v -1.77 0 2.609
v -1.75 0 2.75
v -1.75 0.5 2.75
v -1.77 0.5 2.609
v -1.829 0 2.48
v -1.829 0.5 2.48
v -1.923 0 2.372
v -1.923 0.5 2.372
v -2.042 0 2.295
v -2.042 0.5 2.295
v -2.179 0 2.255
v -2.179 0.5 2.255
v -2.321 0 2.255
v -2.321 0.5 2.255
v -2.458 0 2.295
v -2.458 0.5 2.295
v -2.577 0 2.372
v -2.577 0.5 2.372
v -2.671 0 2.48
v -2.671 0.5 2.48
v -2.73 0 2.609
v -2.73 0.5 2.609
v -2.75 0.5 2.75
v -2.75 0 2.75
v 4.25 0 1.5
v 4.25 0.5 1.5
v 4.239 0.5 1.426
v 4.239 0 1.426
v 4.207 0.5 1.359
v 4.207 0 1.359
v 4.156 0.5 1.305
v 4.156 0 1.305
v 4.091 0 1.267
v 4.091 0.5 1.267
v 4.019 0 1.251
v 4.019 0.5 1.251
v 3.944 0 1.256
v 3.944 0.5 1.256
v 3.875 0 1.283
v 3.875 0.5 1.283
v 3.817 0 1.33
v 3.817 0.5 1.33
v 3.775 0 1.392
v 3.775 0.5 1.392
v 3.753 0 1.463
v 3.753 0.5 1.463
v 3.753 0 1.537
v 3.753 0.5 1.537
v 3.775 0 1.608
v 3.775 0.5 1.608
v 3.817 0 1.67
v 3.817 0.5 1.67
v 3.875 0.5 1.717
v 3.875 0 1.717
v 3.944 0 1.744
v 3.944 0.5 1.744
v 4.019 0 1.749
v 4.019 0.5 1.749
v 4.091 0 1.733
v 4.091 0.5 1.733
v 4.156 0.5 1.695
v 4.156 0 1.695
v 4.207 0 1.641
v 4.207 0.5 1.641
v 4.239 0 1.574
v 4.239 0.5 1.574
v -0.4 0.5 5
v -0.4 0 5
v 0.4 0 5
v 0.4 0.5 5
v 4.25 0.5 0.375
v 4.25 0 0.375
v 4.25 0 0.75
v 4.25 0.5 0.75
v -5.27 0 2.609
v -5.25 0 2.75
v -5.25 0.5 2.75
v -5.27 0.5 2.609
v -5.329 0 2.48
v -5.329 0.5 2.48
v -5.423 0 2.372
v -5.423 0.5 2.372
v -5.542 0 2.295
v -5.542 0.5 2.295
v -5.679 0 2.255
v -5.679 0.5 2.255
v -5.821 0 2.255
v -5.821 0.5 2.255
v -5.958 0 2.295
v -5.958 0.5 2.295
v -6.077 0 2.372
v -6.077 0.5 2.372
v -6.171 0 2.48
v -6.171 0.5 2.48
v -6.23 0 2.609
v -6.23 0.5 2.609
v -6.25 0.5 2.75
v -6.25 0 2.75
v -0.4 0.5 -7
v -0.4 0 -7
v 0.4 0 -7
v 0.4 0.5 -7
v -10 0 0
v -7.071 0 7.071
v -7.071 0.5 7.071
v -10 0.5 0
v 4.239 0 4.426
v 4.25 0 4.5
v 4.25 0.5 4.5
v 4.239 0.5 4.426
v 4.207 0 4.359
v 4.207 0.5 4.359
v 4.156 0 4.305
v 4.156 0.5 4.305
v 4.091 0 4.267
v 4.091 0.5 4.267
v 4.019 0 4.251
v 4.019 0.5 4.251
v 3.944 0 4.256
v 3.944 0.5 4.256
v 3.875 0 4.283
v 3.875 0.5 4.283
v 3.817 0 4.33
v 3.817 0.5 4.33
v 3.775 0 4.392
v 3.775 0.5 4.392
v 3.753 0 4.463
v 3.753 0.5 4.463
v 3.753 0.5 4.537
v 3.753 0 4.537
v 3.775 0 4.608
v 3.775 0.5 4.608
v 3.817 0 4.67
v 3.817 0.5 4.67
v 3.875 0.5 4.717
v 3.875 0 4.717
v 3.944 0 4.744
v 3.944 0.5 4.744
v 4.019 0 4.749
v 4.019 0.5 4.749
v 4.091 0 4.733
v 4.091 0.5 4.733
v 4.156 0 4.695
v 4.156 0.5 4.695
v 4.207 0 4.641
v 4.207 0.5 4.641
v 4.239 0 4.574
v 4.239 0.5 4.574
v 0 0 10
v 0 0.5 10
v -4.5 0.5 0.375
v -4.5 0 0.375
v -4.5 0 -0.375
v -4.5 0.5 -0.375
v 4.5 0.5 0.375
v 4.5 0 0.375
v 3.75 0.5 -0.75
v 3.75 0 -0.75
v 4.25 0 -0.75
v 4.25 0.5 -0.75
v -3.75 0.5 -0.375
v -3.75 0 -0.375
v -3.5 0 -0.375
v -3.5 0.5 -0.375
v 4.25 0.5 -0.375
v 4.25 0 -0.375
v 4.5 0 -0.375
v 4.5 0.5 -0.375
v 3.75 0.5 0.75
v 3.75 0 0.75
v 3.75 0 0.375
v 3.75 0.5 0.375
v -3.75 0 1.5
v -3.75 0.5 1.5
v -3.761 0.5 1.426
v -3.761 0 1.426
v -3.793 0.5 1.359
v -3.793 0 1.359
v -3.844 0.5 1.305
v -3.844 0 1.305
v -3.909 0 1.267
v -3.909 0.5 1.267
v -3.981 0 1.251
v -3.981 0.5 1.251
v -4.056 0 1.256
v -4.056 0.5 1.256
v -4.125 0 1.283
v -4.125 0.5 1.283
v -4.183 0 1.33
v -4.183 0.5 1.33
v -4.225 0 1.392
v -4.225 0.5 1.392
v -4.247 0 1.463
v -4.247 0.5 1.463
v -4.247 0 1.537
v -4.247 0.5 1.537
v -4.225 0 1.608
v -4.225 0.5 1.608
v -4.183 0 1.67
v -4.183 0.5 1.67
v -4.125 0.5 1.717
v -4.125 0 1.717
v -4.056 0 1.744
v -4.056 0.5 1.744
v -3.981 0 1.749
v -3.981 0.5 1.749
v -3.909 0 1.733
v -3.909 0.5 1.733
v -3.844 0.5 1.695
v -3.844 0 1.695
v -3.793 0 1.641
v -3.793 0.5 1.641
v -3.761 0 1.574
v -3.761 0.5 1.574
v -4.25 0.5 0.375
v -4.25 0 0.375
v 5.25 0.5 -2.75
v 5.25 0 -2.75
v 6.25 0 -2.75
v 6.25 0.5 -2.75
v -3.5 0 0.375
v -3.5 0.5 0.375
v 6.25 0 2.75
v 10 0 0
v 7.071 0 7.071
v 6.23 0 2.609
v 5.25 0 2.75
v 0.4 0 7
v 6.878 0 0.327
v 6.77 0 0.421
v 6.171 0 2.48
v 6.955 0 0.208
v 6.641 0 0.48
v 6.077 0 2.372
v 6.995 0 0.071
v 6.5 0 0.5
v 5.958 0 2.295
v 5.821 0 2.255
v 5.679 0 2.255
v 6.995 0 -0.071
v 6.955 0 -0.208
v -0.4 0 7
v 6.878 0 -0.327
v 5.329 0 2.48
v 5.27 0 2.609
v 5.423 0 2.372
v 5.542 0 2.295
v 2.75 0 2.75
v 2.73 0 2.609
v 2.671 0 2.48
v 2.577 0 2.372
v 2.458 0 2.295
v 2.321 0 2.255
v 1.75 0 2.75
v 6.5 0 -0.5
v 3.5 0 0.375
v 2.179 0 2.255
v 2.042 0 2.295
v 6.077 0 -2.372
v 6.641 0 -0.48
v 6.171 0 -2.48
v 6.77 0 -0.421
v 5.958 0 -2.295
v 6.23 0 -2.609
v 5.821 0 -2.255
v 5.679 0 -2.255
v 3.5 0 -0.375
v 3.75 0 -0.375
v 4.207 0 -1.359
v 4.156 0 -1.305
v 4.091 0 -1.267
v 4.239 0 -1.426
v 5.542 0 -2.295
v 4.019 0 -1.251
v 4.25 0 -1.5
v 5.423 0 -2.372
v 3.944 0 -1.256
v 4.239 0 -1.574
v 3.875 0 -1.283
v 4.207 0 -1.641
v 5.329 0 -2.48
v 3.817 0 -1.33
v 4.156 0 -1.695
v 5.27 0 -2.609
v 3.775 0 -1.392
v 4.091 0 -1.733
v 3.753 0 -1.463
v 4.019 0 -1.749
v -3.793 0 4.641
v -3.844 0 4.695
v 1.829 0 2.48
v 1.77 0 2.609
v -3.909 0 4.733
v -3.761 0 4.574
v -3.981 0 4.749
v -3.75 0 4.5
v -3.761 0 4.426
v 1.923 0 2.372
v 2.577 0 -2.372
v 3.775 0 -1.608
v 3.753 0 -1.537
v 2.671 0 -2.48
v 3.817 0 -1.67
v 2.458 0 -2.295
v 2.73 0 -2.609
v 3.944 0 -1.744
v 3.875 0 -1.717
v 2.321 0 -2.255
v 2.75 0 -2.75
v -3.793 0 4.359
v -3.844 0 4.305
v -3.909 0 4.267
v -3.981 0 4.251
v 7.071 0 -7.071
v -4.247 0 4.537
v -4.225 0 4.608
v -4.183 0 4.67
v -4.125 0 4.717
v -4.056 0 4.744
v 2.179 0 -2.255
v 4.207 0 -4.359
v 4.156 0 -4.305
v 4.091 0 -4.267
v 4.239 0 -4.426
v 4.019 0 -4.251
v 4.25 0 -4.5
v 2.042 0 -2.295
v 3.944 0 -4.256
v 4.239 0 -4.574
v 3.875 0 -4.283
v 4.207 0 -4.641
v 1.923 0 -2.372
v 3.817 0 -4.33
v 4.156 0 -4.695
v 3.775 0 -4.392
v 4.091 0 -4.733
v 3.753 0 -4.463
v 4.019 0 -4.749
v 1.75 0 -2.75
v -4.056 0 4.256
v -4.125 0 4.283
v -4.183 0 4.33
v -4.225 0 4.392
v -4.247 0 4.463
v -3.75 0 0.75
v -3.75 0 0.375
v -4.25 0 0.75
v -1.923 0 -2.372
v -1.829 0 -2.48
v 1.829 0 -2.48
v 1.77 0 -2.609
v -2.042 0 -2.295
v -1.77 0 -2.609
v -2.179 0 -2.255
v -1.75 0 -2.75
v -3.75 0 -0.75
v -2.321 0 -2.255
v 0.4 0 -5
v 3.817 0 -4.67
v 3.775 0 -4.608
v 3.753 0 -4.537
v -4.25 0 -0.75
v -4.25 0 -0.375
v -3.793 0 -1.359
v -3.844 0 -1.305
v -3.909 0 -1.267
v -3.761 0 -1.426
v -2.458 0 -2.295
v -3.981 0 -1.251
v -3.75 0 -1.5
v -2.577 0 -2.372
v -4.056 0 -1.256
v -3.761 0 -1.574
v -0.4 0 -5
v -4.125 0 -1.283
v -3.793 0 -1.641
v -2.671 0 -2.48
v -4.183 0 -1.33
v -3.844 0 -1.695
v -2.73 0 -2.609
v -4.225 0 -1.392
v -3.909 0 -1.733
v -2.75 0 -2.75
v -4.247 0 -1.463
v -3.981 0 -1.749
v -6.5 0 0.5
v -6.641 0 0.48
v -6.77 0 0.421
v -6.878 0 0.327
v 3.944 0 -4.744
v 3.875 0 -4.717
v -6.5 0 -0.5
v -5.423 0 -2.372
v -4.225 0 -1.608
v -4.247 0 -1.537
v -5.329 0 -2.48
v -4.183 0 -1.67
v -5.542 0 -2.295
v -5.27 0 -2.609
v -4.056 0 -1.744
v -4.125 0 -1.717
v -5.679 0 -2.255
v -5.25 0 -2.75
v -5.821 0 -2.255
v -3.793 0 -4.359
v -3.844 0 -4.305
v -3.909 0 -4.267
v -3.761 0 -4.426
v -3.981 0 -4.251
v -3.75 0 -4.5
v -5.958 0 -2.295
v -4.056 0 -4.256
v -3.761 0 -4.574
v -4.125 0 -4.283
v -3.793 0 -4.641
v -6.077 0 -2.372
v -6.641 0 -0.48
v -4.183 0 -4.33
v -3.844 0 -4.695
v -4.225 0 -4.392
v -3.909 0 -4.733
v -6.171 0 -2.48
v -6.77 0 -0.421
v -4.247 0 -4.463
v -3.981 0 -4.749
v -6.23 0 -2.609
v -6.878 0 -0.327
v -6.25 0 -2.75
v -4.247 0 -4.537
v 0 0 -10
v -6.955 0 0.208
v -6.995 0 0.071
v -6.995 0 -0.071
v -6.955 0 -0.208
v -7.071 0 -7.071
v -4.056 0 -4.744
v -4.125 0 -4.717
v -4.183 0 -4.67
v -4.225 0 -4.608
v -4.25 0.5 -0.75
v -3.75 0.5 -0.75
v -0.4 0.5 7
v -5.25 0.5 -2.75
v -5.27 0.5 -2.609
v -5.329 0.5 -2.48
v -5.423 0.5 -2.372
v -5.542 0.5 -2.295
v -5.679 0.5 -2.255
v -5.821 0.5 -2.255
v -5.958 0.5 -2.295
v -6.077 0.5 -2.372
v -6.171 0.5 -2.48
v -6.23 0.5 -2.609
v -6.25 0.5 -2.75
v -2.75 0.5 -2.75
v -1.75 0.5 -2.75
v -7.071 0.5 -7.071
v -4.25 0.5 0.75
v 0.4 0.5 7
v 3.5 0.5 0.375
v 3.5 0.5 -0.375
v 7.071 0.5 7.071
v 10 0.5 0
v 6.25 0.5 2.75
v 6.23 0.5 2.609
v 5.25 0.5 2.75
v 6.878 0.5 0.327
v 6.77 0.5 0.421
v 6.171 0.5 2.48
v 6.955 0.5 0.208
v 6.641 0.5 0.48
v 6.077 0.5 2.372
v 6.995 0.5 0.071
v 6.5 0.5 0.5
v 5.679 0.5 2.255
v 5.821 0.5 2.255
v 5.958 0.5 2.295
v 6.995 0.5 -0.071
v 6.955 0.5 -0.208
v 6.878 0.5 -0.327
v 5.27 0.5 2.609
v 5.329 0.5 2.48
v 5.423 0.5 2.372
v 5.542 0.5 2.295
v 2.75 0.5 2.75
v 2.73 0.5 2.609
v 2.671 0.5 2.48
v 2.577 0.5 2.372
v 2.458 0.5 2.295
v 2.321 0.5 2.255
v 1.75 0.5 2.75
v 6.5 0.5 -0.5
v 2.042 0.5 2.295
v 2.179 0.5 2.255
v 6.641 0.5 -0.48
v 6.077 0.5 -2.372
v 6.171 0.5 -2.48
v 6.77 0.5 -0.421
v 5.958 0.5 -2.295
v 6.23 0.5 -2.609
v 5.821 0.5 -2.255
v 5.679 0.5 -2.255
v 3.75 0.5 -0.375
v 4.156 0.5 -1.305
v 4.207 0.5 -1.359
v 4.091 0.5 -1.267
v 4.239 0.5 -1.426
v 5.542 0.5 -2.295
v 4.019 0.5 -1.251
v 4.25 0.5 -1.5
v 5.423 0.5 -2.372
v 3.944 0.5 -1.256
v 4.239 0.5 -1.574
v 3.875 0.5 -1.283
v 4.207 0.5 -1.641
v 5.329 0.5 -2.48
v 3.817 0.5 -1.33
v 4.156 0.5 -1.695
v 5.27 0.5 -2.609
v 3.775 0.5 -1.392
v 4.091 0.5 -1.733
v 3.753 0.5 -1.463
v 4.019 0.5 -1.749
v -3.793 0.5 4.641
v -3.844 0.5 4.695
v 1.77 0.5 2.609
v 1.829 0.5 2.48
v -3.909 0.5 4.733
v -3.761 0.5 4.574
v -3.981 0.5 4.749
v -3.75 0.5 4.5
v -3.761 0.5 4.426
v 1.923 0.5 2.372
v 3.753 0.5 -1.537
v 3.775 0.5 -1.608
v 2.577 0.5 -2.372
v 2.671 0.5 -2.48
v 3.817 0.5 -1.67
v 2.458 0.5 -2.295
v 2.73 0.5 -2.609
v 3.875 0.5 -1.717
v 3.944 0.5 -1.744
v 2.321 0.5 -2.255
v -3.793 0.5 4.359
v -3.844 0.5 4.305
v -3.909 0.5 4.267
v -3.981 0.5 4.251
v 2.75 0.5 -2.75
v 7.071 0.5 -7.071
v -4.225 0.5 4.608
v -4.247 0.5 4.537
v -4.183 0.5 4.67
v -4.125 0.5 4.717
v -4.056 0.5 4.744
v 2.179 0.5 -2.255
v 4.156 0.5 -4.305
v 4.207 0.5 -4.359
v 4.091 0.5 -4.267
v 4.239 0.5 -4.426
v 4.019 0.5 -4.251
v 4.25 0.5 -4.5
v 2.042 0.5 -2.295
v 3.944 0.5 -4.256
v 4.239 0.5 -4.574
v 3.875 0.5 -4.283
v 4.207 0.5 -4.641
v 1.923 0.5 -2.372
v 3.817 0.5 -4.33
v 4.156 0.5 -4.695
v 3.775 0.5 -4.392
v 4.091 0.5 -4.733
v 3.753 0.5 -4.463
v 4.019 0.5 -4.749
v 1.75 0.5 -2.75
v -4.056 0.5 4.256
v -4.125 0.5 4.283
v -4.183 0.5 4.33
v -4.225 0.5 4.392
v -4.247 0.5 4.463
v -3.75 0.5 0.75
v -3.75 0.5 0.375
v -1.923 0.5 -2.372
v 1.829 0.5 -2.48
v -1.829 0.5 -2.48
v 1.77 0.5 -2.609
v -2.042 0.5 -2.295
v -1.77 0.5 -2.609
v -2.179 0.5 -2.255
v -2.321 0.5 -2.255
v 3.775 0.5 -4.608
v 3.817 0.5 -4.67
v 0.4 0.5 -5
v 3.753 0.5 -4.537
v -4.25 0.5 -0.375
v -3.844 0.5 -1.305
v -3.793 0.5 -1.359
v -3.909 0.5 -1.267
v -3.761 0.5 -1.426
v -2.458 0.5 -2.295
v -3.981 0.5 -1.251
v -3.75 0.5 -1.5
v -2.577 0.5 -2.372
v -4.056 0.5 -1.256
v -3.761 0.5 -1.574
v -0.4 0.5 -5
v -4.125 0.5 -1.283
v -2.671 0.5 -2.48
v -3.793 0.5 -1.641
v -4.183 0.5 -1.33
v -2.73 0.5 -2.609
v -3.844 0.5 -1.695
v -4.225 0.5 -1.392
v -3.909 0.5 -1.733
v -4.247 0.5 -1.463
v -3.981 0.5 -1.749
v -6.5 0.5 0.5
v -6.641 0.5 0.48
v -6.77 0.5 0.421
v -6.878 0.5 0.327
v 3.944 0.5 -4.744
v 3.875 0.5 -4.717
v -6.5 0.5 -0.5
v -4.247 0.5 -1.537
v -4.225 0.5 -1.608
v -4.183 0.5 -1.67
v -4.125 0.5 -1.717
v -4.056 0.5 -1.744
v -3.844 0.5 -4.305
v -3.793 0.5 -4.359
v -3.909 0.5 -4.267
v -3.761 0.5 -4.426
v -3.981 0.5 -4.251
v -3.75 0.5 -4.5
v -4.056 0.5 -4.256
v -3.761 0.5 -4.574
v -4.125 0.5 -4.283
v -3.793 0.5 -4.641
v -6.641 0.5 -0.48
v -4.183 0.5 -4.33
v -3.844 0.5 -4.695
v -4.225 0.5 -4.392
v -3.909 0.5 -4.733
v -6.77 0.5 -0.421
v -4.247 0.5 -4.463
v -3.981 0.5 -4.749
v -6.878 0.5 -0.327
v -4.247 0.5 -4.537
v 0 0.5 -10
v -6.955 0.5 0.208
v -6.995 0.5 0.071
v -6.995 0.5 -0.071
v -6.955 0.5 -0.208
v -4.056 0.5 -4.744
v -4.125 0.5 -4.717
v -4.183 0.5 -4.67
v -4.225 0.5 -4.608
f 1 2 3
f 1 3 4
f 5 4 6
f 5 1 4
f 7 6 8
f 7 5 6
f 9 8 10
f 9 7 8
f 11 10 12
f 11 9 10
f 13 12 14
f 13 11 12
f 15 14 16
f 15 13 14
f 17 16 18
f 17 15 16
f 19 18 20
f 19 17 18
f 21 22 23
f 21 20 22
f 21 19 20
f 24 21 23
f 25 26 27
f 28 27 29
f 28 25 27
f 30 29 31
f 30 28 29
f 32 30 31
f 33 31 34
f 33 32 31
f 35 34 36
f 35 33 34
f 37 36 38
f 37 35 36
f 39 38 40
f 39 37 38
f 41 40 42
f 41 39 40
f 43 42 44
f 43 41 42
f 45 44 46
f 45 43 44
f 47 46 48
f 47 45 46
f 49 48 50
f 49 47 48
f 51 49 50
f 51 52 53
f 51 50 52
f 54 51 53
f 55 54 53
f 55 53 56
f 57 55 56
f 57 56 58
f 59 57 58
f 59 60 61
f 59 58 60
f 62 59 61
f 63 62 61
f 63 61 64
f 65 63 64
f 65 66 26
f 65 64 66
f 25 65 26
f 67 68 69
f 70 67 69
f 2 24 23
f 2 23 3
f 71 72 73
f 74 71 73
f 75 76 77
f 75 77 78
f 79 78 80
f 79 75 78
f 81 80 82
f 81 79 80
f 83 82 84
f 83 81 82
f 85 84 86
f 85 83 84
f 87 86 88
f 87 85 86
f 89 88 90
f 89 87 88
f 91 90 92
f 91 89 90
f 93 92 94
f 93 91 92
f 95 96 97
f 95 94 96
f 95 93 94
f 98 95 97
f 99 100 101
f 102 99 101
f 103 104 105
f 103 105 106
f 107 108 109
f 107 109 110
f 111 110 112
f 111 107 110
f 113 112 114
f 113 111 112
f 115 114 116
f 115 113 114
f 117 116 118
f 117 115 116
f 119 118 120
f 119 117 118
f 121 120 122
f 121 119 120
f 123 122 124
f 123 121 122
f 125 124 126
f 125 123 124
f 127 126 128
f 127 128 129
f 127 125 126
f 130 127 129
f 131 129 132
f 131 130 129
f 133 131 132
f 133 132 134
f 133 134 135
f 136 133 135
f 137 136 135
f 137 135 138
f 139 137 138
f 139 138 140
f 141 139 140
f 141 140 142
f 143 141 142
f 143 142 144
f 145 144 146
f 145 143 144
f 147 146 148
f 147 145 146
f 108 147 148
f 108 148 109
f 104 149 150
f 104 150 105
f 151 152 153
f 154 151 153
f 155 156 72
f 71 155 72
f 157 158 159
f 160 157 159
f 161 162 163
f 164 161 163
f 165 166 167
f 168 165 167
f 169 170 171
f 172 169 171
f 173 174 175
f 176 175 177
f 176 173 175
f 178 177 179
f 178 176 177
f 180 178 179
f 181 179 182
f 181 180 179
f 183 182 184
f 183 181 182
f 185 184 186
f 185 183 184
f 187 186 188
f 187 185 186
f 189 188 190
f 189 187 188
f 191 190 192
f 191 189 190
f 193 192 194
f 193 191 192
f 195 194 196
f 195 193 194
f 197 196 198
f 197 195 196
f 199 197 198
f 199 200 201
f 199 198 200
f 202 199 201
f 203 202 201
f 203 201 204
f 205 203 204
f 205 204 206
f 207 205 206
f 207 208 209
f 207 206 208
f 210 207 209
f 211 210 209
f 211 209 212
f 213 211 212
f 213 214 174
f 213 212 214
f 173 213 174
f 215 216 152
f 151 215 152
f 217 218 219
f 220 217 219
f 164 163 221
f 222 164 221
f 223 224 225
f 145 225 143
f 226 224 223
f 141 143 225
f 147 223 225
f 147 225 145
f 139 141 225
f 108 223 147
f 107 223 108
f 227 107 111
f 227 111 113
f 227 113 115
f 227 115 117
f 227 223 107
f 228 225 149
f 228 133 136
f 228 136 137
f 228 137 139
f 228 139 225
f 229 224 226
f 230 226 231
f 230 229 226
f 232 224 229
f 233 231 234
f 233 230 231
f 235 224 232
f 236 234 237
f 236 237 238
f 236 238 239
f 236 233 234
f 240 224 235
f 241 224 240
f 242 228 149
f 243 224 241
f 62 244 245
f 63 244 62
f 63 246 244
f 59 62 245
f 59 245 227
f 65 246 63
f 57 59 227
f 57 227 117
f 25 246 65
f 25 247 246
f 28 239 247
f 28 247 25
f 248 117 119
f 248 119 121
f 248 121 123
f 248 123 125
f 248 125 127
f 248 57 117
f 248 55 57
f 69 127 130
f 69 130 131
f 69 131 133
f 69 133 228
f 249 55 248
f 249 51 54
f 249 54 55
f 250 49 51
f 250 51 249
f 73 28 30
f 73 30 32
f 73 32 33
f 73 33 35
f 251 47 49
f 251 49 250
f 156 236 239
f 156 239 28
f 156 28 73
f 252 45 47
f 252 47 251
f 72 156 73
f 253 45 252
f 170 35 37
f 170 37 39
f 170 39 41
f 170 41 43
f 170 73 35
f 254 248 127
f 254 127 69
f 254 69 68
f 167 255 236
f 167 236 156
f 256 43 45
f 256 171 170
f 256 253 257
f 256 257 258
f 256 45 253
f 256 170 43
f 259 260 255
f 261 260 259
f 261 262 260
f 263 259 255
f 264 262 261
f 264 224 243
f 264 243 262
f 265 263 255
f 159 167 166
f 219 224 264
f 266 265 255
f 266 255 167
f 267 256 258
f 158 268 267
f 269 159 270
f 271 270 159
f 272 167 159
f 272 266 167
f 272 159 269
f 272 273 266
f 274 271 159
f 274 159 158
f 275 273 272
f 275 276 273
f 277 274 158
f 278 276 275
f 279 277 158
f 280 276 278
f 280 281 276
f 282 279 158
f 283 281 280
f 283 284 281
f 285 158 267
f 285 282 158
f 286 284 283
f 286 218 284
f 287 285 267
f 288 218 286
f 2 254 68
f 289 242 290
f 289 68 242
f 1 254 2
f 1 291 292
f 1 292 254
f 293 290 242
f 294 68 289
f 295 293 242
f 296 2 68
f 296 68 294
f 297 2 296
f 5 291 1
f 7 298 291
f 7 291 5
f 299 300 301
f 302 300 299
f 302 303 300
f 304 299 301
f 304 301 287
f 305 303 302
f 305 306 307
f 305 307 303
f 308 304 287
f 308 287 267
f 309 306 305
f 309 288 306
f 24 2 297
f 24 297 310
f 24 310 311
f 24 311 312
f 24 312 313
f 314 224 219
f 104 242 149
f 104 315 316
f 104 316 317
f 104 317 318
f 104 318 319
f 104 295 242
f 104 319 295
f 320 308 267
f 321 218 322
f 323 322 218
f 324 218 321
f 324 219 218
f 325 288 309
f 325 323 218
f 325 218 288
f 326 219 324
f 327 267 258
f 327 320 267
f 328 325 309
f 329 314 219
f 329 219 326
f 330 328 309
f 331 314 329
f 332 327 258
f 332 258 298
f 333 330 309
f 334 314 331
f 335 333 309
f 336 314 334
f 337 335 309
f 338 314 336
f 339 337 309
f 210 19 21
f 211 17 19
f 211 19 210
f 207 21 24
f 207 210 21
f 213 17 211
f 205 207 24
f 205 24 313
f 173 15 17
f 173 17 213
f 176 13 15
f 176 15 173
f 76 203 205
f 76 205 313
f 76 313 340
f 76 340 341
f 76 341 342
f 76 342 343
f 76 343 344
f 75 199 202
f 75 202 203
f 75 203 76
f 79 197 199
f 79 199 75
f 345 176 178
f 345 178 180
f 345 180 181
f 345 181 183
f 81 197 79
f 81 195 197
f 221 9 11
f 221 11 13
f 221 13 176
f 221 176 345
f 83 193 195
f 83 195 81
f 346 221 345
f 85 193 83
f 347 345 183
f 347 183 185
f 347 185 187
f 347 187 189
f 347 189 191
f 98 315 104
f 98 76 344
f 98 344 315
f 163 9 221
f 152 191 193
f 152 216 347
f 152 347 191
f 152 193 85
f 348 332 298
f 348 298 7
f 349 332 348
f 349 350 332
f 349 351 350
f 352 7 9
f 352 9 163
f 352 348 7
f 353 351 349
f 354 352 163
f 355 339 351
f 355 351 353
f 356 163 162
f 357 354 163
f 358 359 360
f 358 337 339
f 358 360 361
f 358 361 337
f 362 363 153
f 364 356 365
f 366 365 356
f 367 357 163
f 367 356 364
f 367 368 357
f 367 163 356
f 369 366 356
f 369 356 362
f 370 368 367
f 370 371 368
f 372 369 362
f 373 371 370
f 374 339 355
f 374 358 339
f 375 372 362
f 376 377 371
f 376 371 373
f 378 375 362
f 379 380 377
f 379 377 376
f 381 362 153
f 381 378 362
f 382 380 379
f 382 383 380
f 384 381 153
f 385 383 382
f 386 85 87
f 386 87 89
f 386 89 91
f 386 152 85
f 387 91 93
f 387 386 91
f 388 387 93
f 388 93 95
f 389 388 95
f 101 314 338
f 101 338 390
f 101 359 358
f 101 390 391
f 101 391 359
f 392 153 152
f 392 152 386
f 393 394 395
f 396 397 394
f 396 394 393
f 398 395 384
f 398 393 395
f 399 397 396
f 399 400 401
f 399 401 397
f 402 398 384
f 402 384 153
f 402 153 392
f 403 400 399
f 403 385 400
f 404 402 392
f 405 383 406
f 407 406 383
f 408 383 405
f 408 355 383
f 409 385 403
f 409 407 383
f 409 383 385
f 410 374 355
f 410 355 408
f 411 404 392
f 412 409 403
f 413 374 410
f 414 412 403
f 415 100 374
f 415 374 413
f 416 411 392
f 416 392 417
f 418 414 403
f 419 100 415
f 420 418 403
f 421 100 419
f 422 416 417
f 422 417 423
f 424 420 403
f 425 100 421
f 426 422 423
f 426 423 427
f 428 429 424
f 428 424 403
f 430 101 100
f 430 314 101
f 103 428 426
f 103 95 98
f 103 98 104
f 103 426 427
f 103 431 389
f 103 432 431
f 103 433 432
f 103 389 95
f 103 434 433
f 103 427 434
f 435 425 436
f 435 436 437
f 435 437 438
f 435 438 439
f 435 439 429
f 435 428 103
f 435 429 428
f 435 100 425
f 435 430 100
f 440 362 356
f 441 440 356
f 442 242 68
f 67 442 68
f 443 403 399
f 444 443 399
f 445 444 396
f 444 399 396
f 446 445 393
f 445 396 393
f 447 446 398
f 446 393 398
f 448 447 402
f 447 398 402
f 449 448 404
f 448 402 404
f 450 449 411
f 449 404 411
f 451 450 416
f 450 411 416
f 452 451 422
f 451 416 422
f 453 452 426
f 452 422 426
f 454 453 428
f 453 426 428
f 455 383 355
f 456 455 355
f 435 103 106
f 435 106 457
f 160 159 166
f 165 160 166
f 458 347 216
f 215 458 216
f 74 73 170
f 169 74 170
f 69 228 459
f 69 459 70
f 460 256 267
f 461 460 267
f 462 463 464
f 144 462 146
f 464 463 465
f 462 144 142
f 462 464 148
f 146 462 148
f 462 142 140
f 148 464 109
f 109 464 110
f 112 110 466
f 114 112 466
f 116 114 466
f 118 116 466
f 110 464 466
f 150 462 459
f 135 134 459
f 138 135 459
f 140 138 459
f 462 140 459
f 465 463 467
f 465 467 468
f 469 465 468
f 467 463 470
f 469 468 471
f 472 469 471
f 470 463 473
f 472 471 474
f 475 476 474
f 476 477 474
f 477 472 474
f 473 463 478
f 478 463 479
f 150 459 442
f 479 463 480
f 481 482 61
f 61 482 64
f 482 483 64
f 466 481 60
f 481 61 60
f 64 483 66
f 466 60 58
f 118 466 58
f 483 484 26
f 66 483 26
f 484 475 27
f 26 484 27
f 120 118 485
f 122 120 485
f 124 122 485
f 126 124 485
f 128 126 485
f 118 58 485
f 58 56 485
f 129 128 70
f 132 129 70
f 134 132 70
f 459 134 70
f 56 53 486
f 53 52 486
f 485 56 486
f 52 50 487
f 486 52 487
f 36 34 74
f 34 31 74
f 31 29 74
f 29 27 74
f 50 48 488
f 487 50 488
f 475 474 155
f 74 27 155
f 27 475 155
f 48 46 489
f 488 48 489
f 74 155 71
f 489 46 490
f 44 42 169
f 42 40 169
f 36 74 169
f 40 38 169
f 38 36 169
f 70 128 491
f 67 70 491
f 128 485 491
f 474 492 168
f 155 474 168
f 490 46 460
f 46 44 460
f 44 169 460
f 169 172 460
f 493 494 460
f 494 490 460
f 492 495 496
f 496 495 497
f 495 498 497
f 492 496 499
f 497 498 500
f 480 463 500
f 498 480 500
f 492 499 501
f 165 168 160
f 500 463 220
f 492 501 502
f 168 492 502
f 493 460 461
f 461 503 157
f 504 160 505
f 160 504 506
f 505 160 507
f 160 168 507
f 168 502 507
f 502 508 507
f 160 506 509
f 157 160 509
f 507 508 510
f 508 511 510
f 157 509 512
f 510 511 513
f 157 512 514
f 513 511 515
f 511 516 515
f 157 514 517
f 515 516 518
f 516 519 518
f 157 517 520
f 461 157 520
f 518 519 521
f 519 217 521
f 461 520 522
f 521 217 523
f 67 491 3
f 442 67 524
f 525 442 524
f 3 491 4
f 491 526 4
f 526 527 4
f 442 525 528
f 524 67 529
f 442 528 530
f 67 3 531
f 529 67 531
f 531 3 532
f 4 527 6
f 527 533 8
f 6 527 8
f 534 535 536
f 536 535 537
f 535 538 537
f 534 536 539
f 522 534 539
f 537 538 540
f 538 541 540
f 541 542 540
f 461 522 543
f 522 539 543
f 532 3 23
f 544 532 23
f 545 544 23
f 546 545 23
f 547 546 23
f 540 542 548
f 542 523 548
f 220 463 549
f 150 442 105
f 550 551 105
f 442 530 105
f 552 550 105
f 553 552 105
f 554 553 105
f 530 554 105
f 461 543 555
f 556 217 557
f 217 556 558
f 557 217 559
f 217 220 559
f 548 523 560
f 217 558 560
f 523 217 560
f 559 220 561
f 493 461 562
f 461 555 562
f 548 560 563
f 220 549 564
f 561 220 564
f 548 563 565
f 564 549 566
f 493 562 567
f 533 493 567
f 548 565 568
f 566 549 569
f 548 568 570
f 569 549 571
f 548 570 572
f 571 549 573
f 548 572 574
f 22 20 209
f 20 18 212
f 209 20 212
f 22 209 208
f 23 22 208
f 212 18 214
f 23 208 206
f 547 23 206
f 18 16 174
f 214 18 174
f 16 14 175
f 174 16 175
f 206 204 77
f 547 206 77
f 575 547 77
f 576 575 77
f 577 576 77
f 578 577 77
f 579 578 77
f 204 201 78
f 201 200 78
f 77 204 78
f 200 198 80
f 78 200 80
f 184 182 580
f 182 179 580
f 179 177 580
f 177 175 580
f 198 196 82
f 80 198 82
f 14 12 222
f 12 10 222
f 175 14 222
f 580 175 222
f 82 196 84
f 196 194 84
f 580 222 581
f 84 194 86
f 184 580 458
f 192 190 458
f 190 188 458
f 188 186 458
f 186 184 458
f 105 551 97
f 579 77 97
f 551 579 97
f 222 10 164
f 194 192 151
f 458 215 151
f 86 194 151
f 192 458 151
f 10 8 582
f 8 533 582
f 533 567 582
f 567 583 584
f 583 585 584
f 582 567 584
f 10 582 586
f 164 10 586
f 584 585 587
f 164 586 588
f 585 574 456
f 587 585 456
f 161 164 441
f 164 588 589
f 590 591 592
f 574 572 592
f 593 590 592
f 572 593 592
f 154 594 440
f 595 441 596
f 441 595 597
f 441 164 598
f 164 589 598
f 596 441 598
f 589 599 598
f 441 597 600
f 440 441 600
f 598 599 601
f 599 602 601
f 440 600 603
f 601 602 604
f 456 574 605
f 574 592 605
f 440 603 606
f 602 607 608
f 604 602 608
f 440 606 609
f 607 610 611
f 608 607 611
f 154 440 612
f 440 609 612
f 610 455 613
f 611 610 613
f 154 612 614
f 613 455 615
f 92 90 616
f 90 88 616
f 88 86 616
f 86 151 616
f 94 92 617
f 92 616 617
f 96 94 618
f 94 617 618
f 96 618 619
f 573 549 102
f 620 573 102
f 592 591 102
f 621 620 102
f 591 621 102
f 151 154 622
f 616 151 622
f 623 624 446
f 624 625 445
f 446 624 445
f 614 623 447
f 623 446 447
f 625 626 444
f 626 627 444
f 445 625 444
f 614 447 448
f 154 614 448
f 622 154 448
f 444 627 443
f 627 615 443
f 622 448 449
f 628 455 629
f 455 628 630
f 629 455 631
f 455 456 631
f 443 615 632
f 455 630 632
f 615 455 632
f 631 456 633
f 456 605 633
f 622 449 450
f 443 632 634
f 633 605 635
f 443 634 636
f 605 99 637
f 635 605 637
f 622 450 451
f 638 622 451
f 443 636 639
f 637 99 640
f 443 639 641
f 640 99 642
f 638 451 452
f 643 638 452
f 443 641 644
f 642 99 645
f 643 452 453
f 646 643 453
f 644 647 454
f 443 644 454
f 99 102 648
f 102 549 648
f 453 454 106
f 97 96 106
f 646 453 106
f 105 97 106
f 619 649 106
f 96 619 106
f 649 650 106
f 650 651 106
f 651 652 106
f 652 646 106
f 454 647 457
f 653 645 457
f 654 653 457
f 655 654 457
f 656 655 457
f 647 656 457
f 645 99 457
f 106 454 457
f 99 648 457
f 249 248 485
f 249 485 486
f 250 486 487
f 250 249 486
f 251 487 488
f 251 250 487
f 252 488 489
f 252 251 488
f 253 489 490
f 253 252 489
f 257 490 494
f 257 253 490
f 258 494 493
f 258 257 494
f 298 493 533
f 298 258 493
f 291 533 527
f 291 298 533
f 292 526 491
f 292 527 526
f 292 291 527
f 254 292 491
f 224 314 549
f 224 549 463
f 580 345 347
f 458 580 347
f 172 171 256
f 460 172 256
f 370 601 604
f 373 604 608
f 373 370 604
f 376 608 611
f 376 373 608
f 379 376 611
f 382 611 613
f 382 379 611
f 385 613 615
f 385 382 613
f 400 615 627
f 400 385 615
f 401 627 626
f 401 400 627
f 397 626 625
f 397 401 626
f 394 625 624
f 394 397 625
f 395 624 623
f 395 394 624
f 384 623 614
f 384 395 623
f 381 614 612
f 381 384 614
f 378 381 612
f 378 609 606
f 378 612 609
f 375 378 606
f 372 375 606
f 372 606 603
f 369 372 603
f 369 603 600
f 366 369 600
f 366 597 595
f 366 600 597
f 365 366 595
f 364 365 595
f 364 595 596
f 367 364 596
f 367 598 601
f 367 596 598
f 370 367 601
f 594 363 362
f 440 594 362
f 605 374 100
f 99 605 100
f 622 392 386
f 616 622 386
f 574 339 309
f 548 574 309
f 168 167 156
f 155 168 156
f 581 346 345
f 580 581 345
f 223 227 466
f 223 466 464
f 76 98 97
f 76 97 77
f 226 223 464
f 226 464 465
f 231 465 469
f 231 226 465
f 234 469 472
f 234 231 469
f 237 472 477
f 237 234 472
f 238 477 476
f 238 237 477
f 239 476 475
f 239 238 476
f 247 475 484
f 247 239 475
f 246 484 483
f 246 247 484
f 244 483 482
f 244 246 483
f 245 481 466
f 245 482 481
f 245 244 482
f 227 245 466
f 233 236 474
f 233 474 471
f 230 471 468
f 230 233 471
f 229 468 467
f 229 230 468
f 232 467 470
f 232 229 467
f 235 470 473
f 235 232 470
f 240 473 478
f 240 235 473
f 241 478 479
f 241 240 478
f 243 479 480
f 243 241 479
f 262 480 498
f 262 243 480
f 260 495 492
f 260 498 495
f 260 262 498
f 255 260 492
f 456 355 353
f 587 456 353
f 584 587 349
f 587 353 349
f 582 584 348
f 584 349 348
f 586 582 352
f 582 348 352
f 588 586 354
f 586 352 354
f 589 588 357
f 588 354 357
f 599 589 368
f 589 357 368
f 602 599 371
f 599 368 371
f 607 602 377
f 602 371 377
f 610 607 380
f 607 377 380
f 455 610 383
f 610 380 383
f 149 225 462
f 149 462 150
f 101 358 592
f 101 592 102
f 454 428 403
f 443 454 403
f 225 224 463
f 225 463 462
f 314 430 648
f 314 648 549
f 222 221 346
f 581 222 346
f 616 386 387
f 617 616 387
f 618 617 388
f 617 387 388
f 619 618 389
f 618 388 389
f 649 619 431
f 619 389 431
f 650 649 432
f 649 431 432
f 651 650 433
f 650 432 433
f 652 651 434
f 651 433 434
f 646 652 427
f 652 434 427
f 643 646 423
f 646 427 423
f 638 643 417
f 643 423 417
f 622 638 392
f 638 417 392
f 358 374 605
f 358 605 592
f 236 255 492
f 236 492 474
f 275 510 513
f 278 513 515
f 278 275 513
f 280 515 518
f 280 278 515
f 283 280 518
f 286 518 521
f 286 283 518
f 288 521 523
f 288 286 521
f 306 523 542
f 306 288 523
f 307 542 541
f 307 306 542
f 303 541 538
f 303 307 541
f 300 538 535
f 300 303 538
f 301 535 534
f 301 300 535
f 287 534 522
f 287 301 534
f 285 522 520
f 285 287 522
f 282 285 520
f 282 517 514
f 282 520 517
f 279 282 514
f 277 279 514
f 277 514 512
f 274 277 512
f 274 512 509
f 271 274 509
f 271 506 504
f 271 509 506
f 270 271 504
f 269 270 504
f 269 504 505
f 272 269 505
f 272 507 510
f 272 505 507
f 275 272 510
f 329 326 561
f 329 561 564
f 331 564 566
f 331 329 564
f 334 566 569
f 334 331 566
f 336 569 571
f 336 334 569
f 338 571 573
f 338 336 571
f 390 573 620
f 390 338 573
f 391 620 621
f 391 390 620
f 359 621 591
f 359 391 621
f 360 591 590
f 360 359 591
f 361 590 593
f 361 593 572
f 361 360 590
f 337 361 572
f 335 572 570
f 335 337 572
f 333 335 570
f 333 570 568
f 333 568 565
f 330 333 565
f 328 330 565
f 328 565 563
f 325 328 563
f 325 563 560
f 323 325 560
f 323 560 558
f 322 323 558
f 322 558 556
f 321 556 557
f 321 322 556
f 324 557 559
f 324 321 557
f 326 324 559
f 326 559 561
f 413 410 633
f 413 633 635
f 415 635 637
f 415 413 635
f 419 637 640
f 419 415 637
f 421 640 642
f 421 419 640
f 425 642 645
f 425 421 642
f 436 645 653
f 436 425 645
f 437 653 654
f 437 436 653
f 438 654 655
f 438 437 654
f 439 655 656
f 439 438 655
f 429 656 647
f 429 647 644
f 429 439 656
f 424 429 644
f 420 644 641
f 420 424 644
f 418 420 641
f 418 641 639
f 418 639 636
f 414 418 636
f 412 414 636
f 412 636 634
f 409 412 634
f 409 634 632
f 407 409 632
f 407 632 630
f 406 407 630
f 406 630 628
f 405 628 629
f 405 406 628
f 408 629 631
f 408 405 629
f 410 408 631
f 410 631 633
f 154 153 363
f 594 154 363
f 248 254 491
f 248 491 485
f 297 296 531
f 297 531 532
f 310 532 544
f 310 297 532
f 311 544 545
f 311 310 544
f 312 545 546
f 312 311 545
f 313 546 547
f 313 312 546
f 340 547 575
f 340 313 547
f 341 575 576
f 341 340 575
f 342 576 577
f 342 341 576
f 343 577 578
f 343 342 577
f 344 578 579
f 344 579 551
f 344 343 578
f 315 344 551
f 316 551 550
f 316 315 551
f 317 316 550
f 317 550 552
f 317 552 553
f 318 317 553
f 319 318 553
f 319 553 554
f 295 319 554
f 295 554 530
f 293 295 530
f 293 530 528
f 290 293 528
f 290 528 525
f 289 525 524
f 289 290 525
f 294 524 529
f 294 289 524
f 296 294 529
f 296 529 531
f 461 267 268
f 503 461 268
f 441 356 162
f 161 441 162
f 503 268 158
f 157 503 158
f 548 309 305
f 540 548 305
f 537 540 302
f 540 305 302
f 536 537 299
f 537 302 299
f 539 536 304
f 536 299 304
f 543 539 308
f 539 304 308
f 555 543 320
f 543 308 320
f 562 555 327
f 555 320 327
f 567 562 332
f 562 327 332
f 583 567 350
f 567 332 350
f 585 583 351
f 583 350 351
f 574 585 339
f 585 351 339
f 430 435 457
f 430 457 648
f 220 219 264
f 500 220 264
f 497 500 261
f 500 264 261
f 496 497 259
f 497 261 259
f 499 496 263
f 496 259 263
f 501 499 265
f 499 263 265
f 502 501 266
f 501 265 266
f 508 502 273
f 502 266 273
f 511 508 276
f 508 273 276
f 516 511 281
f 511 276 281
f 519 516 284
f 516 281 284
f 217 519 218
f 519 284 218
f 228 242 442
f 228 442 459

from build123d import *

# Parameters (mm, degrees)
SKETCH1_R      = 0.25
SKETCH1_W      = 0.8
SKETCH1_H      = 2
EXTRUDE1_DEPTH = 0.5
SKETCH2_R      = 0.25
EXTRUDE2_DEPTH = 1.5


with BuildPart() as part:
    # Sketch1 → Extrude1 (new body)
    with BuildSketch(Plane(origin=(0, 0, 0), x_dir=(1, 0, 0), z_dir=(0, 1, 0))):
        Polygon((-7.071067812, 7.071067812), (0, 10), (7.071067812, 7.071067812), (10, 0), (7.071067812, -7.071067812), (0, -10), (-7.071067812, -7.071067812), (-10, 0), align=None)
        with Locations((-4, 4.5)):
            Circle(SKETCH1_R, mode=Mode.SUBTRACT)
        with Locations((4, 4.5)):
            Circle(SKETCH1_R, mode=Mode.SUBTRACT)
        with Locations((4, -4.5)):
            Circle(SKETCH1_R, mode=Mode.SUBTRACT)
        with Locations((-4, -4.5)):
            Circle(SKETCH1_R, mode=Mode.SUBTRACT)
        with Locations((0, 6)):
            Rectangle(SKETCH1_W, SKETCH1_H, mode=Mode.SUBTRACT)
        with Locations((0, -6)):
            Rectangle(SKETCH1_W, SKETCH1_H, mode=Mode.SUBTRACT)
    extrude(amount=EXTRUDE1_DEPTH)

    # Sketch2 → Extrude2 (cut, through all)
    with BuildSketch(Plane(origin=(0, 0, 0), x_dir=(1, 0, 0), z_dir=(0, 1, 0))):
        with Locations((4, 1.5)):
            Circle(SKETCH2_R)
        with Locations((4, -1.5)):
            Circle(SKETCH2_R)
        with Locations((-4, 1.5)):
            Circle(SKETCH2_R)
        with Locations((-4, -1.5)):
            Circle(SKETCH2_R)
        Polygon((3.75, 0.75), (4.25, 0.75), (4.25, 0.375), (4.5, 0.375), (4.5, -0.375), (4.25, -0.375), (4.25, -0.75), (3.75, -0.75), (3.75, -0.375), (3.5, -0.375), (3.5, 0.375), (3.75, 0.375), align=None)
        Polygon((-3.5, 0.375), (-3.5, -0.375), (-3.75, -0.375), (-3.75, -0.75), (-4.25, -0.75), (-4.25, -0.375), (-4.5, -0.375), (-4.5, 0.375), (-4.25, 0.375), (-4.25, 0.75), (-3.75, 0.75), (-3.75, 0.375), align=None)
        with BuildLine():
            Line((-6.5, 0.5), (-6.5, -0.5))
            ThreePointArc((-6.5, -0.5), (-7, 0), (-6.5, 0.5))
        make_face()
        with BuildLine():
            Line((6.5, 0.5), (6.5, -0.5))
            ThreePointArc((6.5, -0.5), (7, 0), (6.5, 0.5))
        make_face()
        with BuildLine():
            Line((-6.25, 2.75), (-5.25, 2.75))
            ThreePointArc((-5.25, 2.75), (-5.75, 2.25), (-6.25, 2.75))
        make_face()
        with BuildLine():
            Line((-2.75, 2.75), (-1.75, 2.75))
            ThreePointArc((-1.75, 2.75), (-2.25, 2.25), (-2.75, 2.75))
        make_face()
        with BuildLine():
            Line((1.75, 2.75), (2.75, 2.75))
            ThreePointArc((2.75, 2.75), (2.25, 2.25), (1.75, 2.75))
        make_face()
        with BuildLine():
            Line((5.25, 2.75), (6.25, 2.75))
            ThreePointArc((6.25, 2.75), (5.75, 2.25), (5.25, 2.75))
        make_face()
        with BuildLine():
            Line((-6.25, -2.75), (-5.25, -2.75))
            ThreePointArc((-5.25, -2.75), (-5.75, -2.25), (-6.25, -2.75))
        make_face()
        with BuildLine():
            Line((-2.75, -2.75), (-1.75, -2.75))
            ThreePointArc((-1.75, -2.75), (-2.25, -2.25), (-2.75, -2.75))
        make_face()
        with BuildLine():
            Line((1.75, -2.75), (2.75, -2.75))
            ThreePointArc((2.75, -2.75), (2.25, -2.25), (1.75, -2.75))
        make_face()
        with BuildLine():
            Line((5.25, -2.75), (6.25, -2.75))
            ThreePointArc((6.25, -2.75), (5.75, -2.25), (5.25, -2.75))
        make_face()
    extrude(amount=EXTRUDE2_DEPTH, mode=Mode.SUBTRACT)


solid = part.part
